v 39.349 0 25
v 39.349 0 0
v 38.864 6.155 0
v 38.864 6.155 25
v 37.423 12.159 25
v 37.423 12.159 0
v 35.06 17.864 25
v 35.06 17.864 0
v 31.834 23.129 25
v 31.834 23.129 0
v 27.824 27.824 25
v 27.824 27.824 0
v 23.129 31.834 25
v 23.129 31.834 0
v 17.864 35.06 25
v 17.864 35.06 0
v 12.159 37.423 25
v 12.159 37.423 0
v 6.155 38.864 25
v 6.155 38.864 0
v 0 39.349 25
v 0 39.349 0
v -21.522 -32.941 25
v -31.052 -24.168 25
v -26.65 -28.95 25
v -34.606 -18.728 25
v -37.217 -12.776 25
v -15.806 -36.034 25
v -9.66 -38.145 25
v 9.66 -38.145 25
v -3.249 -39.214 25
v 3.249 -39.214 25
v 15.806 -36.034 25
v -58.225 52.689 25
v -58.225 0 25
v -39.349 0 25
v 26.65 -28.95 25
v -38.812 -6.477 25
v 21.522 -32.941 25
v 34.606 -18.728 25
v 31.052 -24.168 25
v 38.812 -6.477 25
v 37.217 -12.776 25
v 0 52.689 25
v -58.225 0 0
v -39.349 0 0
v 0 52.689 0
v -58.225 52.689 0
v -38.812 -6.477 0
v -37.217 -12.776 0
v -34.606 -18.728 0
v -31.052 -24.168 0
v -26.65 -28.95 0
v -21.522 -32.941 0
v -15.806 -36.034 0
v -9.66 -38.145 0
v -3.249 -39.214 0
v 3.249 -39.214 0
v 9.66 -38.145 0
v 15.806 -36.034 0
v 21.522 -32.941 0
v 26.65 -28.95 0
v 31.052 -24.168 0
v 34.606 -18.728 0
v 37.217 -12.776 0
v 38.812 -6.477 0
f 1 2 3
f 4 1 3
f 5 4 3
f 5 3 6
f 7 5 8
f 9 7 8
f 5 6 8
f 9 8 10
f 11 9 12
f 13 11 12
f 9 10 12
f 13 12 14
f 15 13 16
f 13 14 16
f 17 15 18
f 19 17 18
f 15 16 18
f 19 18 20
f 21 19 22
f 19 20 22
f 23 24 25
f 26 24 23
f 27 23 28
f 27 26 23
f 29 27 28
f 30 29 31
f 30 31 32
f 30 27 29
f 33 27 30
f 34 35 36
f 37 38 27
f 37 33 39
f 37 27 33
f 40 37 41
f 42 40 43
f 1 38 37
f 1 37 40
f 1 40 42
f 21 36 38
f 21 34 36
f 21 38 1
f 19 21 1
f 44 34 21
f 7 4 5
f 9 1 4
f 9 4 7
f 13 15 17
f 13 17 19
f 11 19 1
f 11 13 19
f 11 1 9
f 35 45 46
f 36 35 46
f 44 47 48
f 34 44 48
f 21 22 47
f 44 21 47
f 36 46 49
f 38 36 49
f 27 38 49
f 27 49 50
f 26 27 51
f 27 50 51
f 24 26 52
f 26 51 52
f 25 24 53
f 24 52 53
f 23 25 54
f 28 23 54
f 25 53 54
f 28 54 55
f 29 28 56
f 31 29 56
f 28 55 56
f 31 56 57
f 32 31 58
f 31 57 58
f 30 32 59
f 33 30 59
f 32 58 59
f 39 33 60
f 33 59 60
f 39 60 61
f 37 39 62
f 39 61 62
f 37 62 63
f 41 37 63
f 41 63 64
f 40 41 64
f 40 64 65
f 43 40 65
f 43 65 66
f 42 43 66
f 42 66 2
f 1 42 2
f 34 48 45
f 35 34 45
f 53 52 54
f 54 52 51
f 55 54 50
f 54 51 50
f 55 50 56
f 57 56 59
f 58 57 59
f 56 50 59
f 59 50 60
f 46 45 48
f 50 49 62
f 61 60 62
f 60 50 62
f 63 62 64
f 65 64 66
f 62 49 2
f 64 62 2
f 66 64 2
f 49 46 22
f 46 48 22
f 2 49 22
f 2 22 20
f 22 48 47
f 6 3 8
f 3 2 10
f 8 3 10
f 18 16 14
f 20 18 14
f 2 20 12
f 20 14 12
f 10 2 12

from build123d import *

# Parameters (mm, degrees)
F1_DEPTH = 25
F2_DEPTH = 25


with BuildPart() as f1:
    # F0 (on Top) → F1 (new body)
    with BuildSketch(Plane.XY):
        with BuildLine():
            ThreePointArc((-39.348634, 0), (-27.823686, 27.823686), (0, 39.348634))
            Line((0, 39.348634), (0, 52.689109))
            Line((0, 52.689109), (-58.225289, 52.689109))
            Line((-58.225289, 52.689109), (-58.225289, 0))
            Line((-58.225289, 0), (-39.348634, 0))
        make_face()
    extrude(amount=F1_DEPTH)

    # F0 (on Top) → F2 (join)
    with BuildSketch(Plane.XY):
        with BuildLine():
            ThreePointArc((-39.348634, 0), (0, -39.348634), (39.348634, 0))
            ThreePointArc((39.348634, 0), (27.823686, 27.823686), (0, 39.348634))
            Line((0, 39.348634), (0, 0))
            Line((0, 0), (-39.348634, 0))
        make_face()
        with BuildLine():
            Line((0, 0), (0, 39.348634))
            ThreePointArc((0, 39.348634), (-27.823686, 27.823686), (-39.348634, 0))
            Line((-39.348634, 0), (0, 0))
        make_face()
    extrude(amount=F2_DEPTH)


solid = f1.part
